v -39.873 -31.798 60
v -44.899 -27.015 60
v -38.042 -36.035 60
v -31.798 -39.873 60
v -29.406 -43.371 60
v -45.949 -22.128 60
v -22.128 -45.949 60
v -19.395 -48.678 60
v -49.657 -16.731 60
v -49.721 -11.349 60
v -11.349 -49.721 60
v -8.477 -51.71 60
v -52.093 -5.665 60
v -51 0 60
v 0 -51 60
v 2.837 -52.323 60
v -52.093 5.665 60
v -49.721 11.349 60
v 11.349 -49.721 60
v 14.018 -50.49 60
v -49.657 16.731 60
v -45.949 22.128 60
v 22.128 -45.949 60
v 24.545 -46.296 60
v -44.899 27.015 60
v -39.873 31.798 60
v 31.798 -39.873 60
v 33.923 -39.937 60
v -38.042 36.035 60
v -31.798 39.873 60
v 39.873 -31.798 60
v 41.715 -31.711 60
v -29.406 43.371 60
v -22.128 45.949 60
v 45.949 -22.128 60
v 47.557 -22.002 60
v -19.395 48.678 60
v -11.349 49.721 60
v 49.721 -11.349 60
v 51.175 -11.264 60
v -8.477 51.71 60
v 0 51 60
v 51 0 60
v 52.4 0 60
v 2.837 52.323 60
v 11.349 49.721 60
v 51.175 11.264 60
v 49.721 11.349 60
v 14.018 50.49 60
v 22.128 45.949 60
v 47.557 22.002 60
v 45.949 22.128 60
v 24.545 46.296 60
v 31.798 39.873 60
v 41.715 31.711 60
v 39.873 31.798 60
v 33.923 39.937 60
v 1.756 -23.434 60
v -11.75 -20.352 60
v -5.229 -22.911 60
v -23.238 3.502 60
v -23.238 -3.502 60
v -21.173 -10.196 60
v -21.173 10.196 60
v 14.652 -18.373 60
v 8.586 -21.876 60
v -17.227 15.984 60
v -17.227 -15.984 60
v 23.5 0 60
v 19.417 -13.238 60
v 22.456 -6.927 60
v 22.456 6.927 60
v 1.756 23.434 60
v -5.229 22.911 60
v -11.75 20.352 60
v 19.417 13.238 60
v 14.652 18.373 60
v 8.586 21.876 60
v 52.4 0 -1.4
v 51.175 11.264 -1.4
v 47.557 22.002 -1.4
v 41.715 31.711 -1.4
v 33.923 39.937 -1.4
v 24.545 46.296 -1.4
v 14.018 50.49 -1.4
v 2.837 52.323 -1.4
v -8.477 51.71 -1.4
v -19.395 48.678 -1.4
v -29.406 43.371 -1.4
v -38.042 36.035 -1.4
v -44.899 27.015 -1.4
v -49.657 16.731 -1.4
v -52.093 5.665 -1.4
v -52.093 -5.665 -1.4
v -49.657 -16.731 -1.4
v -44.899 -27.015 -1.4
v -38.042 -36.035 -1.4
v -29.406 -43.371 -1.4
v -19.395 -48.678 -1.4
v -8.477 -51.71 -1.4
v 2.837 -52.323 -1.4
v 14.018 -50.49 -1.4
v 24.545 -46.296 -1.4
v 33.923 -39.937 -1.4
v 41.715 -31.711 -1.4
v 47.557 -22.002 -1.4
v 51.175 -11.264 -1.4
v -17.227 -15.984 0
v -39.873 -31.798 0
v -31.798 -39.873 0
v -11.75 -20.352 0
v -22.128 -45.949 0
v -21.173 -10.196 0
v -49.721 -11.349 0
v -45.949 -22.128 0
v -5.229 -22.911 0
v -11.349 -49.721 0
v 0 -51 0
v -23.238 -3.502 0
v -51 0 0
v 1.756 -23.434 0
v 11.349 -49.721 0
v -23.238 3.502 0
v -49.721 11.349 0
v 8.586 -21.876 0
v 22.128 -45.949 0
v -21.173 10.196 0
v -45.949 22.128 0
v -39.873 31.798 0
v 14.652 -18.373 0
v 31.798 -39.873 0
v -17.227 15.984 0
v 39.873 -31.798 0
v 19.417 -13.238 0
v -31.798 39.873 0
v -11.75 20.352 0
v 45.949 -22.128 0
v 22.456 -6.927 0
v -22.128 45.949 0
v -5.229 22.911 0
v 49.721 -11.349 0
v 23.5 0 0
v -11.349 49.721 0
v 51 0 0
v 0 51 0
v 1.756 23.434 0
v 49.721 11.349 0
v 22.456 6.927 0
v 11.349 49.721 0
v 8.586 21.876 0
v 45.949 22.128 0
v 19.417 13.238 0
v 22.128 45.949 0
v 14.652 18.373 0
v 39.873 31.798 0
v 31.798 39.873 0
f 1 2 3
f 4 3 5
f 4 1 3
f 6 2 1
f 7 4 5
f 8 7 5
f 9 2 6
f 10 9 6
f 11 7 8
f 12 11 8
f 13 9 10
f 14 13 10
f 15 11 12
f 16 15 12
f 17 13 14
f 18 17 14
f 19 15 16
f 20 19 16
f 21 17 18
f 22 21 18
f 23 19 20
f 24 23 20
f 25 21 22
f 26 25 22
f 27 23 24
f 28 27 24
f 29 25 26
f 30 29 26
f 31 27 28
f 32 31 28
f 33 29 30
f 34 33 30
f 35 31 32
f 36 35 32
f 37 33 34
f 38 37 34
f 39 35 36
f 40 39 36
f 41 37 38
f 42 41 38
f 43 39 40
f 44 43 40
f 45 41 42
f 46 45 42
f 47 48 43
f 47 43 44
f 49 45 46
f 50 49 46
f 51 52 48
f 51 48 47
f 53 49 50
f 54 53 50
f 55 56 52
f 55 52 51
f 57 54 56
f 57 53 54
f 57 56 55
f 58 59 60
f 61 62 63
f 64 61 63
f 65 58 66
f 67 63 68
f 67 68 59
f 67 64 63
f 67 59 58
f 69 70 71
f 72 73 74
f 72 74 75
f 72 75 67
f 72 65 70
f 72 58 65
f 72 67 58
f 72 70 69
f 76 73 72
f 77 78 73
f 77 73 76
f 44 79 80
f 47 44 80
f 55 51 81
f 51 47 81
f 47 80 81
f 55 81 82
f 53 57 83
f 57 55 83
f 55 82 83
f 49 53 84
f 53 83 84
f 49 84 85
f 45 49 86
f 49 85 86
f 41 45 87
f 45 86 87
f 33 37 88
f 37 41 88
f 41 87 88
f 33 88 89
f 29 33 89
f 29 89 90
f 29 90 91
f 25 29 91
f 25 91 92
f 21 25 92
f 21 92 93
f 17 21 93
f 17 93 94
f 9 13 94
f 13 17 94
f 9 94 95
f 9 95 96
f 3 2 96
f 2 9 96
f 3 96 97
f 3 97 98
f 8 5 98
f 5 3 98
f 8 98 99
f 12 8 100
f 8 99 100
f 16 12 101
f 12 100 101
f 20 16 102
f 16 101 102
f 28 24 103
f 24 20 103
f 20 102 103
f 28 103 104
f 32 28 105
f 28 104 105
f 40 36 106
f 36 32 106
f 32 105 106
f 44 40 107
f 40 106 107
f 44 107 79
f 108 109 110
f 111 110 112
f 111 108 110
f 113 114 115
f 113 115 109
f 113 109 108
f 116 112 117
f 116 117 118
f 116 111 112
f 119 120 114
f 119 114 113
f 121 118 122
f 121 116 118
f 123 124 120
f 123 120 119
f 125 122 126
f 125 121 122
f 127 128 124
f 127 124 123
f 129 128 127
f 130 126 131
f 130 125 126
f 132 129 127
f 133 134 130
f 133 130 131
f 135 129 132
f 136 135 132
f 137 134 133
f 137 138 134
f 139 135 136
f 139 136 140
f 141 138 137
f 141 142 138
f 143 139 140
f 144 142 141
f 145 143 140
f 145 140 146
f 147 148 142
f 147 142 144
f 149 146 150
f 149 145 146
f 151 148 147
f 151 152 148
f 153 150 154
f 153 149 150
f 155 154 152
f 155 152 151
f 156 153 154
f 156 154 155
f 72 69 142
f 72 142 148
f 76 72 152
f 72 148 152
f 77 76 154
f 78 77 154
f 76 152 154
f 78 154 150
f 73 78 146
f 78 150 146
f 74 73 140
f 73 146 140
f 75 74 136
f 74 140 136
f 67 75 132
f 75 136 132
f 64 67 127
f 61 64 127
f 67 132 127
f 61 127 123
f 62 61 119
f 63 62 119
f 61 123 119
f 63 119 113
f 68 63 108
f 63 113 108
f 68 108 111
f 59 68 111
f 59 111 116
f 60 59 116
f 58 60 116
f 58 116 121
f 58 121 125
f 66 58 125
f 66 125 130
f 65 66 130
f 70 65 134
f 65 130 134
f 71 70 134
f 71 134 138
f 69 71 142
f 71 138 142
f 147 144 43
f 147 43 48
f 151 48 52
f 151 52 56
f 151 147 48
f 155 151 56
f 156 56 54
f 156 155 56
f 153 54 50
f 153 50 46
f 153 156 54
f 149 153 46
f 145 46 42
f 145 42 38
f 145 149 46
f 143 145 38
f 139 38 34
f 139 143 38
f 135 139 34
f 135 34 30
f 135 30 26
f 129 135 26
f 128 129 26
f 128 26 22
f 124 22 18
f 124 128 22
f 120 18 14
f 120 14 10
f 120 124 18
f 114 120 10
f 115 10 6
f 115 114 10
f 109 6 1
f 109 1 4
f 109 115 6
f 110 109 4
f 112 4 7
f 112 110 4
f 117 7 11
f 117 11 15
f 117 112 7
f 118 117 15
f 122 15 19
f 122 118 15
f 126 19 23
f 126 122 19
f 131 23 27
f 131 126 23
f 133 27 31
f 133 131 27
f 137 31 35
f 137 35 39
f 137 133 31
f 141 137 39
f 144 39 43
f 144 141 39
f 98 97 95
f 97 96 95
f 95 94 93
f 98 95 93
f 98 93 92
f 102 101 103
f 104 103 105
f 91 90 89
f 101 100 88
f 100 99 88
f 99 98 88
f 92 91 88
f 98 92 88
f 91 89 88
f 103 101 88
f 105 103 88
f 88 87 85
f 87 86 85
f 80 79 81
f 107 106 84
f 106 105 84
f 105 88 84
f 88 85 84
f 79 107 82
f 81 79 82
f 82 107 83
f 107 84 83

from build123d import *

# Parameters (mm, degrees)
SKETCH_R     = 51
PAD_DEPTH    = 60
THICKNESS_T  = 1.4
SKETCH001_R  = 23.5
PAD001_DEPTH = 60


with BuildPart() as part:
    # Sketch → Pad (new body)
    with BuildSketch(Plane.XY):
        Circle(SKETCH_R)
    extrude(amount=PAD_DEPTH)

    # Thickness
    thickness_openings = [part.faces().sort_by_distance(p)[0] for p in [
        (0, 0, 60),
    ]]
    offset(amount=THICKNESS_T, openings=thickness_openings, kind=Kind.INTERSECTION)

    # Sketch001 (on Face2 of Thickness) → Pad001 (join)
    with BuildSketch(Plane.XY):
        Circle(SKETCH001_R)
    extrude(amount=PAD001_DEPTH)


solid = part.part
